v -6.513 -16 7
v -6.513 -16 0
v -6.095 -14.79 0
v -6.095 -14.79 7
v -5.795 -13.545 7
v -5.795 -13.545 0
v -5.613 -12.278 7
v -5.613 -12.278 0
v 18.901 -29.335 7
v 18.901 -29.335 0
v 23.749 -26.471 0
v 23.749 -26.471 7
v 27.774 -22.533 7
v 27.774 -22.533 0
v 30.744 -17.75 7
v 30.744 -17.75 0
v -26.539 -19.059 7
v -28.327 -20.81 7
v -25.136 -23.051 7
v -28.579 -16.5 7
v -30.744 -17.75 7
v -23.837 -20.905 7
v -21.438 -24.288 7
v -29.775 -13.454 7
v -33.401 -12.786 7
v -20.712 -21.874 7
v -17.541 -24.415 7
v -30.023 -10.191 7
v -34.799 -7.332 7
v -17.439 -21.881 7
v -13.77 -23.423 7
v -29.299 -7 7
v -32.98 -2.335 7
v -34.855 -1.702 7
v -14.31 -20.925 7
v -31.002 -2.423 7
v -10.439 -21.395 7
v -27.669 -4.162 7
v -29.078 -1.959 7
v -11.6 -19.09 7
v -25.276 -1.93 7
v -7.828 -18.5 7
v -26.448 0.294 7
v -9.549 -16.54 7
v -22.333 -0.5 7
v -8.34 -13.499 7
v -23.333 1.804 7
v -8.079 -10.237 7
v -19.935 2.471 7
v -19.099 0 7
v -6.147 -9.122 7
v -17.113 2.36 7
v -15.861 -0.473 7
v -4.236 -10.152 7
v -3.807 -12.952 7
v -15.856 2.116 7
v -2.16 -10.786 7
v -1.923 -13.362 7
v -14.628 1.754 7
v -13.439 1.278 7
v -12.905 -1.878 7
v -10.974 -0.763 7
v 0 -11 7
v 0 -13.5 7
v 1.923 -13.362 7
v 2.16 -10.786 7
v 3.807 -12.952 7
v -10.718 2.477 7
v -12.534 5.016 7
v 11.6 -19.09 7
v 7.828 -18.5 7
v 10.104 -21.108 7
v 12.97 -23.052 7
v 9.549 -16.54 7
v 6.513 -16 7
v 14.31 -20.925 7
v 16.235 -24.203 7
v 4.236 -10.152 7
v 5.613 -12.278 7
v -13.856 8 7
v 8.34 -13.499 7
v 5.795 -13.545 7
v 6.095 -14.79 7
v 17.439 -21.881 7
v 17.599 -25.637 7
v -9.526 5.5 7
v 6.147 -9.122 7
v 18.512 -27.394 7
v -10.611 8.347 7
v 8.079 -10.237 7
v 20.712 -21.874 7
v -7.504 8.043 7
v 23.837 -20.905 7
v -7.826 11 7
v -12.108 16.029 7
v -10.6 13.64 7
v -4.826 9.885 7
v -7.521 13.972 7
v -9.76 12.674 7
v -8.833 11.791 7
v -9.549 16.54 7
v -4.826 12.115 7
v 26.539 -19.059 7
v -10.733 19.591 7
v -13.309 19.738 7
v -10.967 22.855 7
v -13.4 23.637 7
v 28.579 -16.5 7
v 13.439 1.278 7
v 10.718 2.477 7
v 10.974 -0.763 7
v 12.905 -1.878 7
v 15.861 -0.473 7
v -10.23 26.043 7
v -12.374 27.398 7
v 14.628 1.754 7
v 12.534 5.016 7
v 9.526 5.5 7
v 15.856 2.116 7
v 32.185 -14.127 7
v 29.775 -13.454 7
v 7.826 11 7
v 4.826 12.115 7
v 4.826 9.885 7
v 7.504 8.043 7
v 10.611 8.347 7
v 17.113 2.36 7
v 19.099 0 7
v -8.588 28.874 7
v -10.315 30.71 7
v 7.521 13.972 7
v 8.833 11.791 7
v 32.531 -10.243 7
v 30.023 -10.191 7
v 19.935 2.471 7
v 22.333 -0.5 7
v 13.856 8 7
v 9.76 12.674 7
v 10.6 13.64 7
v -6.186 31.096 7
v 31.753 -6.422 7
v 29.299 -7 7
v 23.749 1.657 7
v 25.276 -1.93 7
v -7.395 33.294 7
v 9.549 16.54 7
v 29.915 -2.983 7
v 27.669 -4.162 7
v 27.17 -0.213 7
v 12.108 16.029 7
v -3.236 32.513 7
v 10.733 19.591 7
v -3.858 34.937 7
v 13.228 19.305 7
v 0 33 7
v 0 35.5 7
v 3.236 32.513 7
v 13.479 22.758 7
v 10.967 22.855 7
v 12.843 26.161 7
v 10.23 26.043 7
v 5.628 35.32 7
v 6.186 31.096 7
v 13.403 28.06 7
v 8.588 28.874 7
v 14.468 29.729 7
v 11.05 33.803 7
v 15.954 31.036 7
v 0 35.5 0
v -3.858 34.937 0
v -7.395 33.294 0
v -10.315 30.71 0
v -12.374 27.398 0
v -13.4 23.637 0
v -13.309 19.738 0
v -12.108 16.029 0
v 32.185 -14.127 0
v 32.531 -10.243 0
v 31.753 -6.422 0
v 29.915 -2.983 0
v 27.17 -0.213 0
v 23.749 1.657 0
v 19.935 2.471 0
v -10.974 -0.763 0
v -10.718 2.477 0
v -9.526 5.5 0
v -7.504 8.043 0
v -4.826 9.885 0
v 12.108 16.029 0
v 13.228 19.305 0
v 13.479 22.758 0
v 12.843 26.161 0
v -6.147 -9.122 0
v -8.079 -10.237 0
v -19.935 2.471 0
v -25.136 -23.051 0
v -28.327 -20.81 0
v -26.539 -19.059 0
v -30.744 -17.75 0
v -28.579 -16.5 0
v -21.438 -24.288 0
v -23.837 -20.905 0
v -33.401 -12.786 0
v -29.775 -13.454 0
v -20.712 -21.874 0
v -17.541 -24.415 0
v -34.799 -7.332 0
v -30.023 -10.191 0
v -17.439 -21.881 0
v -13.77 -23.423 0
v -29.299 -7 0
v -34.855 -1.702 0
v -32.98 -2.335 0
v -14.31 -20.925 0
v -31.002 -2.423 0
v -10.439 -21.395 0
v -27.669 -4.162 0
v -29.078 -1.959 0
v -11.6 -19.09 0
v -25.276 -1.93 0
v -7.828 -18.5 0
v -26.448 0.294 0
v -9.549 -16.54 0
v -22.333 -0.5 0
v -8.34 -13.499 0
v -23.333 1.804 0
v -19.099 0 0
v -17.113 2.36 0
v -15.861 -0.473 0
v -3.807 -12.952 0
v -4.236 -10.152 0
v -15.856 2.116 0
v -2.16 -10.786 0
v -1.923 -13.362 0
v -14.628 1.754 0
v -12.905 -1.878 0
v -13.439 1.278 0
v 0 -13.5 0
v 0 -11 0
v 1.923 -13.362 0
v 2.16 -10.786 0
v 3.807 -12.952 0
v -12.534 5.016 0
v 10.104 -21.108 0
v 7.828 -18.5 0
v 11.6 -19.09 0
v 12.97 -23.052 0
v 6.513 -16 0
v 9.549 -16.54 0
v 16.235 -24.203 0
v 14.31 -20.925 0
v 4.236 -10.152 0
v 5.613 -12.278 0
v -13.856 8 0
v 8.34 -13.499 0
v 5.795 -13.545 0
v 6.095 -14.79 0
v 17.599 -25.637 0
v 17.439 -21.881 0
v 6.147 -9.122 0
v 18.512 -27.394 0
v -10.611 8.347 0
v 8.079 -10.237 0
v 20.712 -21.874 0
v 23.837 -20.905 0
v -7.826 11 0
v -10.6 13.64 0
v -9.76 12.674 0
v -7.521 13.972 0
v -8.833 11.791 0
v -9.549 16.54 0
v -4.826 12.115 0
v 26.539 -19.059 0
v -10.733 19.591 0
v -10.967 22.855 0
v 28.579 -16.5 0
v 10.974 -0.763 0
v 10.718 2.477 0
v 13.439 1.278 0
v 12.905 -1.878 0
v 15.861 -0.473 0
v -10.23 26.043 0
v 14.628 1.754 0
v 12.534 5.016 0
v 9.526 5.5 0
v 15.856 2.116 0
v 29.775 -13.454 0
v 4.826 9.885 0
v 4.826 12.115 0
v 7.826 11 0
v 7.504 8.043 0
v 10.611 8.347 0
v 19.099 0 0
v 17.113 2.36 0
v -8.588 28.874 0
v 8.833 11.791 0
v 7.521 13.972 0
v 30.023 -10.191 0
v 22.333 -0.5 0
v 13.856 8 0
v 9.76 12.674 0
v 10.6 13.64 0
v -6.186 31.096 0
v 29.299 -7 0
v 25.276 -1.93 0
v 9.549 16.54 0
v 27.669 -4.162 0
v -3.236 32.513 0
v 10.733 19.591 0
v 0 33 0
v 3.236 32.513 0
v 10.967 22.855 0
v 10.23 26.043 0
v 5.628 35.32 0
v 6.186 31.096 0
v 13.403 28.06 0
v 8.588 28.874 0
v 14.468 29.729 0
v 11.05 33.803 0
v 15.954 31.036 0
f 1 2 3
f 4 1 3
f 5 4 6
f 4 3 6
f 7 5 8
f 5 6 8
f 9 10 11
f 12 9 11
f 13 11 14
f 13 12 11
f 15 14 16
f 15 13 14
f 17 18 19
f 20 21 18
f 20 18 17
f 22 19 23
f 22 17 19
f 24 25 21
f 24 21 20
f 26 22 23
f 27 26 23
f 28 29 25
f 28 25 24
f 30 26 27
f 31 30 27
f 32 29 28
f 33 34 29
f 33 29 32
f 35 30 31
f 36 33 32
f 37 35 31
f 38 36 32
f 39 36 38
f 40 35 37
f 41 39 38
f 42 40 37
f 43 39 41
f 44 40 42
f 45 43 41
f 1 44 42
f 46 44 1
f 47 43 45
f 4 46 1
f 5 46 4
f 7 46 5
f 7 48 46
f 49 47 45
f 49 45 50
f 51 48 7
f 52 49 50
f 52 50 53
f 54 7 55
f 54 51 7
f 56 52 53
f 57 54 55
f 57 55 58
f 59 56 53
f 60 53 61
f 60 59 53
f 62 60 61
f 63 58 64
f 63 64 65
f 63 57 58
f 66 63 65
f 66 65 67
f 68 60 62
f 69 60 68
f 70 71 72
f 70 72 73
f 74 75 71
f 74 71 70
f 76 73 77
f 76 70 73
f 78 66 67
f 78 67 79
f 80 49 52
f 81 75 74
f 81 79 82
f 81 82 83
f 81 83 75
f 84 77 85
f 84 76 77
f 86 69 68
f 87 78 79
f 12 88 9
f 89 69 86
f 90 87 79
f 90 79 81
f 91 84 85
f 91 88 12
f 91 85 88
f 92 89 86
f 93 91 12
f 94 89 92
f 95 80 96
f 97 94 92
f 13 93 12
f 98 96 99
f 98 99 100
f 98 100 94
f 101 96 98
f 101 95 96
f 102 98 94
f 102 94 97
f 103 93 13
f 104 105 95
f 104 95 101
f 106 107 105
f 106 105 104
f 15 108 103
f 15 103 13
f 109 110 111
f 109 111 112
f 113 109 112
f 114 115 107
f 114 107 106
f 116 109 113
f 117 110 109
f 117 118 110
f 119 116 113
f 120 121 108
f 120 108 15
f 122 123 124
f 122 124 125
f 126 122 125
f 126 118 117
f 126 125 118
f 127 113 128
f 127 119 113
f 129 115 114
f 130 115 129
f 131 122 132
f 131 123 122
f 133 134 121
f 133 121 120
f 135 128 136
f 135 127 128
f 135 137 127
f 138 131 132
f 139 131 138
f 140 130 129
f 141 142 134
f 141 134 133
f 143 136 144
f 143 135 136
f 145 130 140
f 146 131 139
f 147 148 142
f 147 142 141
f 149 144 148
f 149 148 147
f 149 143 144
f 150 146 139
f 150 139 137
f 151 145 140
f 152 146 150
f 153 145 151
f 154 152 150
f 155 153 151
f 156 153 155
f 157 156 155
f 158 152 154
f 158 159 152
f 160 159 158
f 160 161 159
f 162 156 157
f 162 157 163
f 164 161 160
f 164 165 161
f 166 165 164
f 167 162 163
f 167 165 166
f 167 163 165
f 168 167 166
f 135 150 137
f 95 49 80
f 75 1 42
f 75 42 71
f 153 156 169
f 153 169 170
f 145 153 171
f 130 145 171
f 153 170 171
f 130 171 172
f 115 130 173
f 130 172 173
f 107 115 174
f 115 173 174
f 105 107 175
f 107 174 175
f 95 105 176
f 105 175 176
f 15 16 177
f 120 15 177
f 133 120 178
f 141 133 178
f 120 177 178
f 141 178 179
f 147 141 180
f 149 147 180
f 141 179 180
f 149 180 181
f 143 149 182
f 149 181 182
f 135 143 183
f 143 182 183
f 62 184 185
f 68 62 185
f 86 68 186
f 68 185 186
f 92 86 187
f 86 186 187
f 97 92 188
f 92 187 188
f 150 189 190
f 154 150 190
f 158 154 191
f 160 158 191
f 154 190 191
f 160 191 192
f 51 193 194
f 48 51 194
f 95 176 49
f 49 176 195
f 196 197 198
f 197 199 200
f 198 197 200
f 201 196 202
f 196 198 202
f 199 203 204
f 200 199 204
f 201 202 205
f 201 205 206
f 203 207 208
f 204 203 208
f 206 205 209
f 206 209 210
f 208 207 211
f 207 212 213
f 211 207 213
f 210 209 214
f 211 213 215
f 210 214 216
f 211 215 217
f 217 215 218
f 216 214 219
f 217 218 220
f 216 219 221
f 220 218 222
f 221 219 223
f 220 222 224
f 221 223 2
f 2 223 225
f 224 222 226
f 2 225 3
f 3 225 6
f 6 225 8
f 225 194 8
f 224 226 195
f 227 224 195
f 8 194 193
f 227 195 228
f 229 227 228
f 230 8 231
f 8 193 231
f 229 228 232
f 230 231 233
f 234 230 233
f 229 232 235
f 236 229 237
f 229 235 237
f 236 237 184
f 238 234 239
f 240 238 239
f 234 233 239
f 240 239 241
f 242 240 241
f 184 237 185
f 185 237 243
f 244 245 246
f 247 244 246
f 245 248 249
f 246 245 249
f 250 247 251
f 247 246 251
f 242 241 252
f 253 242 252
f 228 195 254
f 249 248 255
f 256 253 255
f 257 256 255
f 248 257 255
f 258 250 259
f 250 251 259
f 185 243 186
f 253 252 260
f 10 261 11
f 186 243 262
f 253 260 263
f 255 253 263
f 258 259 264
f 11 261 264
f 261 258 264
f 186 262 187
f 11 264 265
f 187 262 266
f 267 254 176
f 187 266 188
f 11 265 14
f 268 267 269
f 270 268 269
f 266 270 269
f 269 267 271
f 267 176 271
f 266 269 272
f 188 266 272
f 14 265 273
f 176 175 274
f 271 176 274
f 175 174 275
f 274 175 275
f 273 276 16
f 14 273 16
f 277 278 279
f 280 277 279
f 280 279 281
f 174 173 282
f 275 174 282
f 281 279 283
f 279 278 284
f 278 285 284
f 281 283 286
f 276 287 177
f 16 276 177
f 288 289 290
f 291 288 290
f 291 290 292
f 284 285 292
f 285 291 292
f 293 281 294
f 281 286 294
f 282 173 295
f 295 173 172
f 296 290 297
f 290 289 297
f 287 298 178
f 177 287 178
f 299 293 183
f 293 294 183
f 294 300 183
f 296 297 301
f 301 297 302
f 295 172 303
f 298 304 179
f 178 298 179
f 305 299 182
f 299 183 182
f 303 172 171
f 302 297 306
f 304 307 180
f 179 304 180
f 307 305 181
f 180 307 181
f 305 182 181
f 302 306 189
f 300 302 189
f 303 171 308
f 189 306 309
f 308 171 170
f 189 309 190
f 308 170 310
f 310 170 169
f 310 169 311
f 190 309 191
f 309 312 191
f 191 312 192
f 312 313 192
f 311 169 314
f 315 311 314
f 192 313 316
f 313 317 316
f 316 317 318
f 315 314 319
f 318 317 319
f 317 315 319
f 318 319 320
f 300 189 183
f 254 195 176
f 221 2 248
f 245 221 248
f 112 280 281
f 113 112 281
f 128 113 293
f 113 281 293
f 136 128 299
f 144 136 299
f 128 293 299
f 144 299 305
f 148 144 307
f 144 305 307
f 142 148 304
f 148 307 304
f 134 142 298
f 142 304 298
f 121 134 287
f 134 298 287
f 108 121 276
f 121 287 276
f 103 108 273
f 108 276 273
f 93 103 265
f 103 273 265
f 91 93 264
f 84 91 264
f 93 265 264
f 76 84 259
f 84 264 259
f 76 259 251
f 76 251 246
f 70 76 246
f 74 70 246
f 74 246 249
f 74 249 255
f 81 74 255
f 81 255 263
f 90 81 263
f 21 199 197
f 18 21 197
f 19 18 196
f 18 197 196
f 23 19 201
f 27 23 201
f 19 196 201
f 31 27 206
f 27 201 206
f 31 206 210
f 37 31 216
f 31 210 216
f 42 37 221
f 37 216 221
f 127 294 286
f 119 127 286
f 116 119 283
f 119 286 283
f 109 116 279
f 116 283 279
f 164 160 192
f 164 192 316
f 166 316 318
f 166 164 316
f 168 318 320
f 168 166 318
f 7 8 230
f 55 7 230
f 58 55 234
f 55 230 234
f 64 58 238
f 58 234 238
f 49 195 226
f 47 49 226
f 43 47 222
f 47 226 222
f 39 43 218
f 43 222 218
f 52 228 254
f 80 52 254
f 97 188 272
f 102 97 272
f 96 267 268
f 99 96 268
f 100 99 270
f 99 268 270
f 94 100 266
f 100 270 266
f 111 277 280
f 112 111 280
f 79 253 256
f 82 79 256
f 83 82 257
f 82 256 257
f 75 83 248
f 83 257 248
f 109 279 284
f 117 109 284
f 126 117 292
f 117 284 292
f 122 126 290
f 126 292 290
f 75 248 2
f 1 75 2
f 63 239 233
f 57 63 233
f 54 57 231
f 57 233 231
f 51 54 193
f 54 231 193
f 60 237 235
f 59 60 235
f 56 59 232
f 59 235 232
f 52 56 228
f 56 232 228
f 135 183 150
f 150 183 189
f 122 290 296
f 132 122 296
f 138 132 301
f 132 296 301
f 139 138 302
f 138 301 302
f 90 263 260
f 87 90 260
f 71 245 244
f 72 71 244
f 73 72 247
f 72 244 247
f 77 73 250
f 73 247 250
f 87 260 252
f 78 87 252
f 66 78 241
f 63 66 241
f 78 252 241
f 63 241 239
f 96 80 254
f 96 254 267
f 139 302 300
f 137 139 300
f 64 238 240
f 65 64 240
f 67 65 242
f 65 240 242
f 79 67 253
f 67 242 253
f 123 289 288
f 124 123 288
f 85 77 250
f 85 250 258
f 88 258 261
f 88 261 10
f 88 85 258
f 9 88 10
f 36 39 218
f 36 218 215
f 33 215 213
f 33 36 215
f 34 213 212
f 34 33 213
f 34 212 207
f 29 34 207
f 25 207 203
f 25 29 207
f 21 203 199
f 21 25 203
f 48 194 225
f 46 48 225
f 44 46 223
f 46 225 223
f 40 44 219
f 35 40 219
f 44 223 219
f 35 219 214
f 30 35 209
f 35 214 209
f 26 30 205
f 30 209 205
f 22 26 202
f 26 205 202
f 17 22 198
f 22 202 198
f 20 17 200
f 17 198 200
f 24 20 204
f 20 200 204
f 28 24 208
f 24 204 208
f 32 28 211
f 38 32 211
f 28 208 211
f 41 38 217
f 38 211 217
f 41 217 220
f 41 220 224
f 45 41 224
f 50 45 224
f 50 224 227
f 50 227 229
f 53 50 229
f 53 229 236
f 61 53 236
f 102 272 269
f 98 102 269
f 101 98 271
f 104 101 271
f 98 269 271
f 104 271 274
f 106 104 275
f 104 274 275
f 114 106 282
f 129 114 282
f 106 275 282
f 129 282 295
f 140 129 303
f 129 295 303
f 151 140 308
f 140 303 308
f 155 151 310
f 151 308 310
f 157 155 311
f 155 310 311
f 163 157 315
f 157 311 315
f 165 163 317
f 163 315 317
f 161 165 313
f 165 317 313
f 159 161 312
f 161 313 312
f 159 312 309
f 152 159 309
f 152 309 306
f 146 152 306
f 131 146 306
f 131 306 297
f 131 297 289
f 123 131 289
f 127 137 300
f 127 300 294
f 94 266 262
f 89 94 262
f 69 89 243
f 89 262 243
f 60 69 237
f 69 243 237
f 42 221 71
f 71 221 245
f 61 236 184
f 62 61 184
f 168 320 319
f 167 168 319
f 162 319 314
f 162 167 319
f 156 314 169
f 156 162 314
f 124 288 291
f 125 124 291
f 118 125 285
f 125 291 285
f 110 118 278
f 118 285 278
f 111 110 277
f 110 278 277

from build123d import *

# Parameters (mm, degrees)
F1_DEPTH = 7
F3_DEPTH = 7


with BuildPart() as f1:
    # F0 (on Top) → F1 (new body)
    with BuildSketch(Plane.XY):
        with BuildLine():
            Line((-13.8564064606, 8), (-10.6000951209, 13.6400966855))
            ThreePointArc((-10.6000951209, 13.6400966855), (-11.4165365305, 14.7949535985), (-12.1076766085, 16.0288889524))
            Line((-12.1076766085, 16.0288889524), (-19.9352633315, 2.4711110476))
            ThreePointArc((-19.9352633315, 2.4711110476), (-18.5210739294, 2.4895338594), (-17.1127178002, 2.3599033145))
            Line((-17.1127178002, 2.3599033145), (-13.8564064606, 8))
        make_face()
        with BuildLine():
            Line((-7.8262379212, 11), (-4.8262379212, 11))
            Line((-4.8262379212, 11), (-4.8262379212, 12.1152932503))
            ThreePointArc((-4.8262379212, 12.1152932503), (0, 33), (4.8262379212, 12.1152932503))
            Line((4.8262379212, 12.1152932503), (4.8262379212, 11))
            Line((4.8262379212, 11), (7.8262379212, 11))
            ThreePointArc((7.8262379212, 11), (9.3072533528, 12.2211946012), (10.6000951209, 13.6400966855))
            ThreePointArc((10.6000951209, 13.6400966855), (11.4165365305, 14.7949535985), (12.1076766085, 16.0288889524))
            ThreePointArc((12.1076766085, 16.0288889524), (0, 35.5), (-12.1076766085, 16.0288889524))
            ThreePointArc((-12.1076766085, 16.0288889524), (-11.4165365305, 14.7949535985), (-10.6000951209, 13.6400966855))
            ThreePointArc((-10.6000951209, 13.6400966855), (-9.3072533528, 12.2211946012), (-7.8262379212, 11))
        make_face()
        with BuildLine():
            ThreePointArc((12.1076766085, 16.0288889524), (11.4165365305, 14.7949535985), (10.6000951209, 13.6400966855))
            Line((10.6000951209, 13.6400966855), (13.8564064606, 8))
            Line((13.8564064606, 8), (17.1127178002, 2.3599033145))
            ThreePointArc((17.1127178002, 2.3599033145), (18.5210739294, 2.4895338594), (19.9352633315, 2.4711110476))
            Line((19.9352633315, 2.4711110476), (12.1076766085, 16.0288889524))
        make_face()
        with BuildLine():
            ThreePointArc((0, -11), (-3.2138778591, -10.5200279993), (-6.1472881936, -9.1219980194))
            Line((-6.1472881936, -9.1219980194), (-8.0790327684, -10.2372912697))
            ThreePointArc((-8.0790327684, -10.2372912697), (-28.5788383249, -16.5), (-12.9052706897, -1.8780019806))
            Line((-12.9052706897, -1.8780019806), (-10.9735261148, -0.7627087303))
            ThreePointArc((-10.9735261148, -0.7627087303), (-9.5262794416, 5.5), (-4.8262379212, 9.8847067497))
            Line((-4.8262379212, 9.8847067497), (-4.8262379212, 11))
            Line((-4.8262379212, 11), (-7.8262379212, 11))
            ThreePointArc((-7.8262379212, 11), (-11.6913429511, 6.75), (-13.4393984023, 1.2777208559))
            ThreePointArc((-13.4393984023, 1.2777208559), (-15.2374916656, 1.9497205423), (-17.1127178002, 2.3599033145))
            ThreePointArc((-17.1127178002, 2.3599033145), (-18.5210739294, 2.4895338594), (-19.9352633315, 2.4711110476))
            ThreePointArc((-19.9352633315, 2.4711110476), (-30.7439018343, -17.75), (-7.8275867229, -18.5))
            Line((-7.8275867229, -18.5), (7.8275867229, -18.5))
            ThreePointArc((7.8275867229, -18.5), (30.7439018343, -17.75), (19.9352633315, 2.4711110476))
            ThreePointArc((19.9352633315, 2.4711110476), (18.5210739294, 2.4895338594), (17.1127178002, 2.3599033145))
            ThreePointArc((17.1127178002, 2.3599033145), (15.2374916656, 1.9497205423), (13.4393984023, 1.2777208559))
            ThreePointArc((13.4393984023, 1.2777208559), (11.6913429511, 6.75), (7.8262379212, 11))
            Line((7.8262379212, 11), (4.8262379212, 11))
            Line((4.8262379212, 11), (4.8262379212, 9.8847067497))
            ThreePointArc((4.8262379212, 9.8847067497), (9.5262794416, 5.5), (10.9735261148, -0.7627087303))
            Line((10.9735261148, -0.7627087303), (12.9052706897, -1.8780019806))
            ThreePointArc((12.9052706897, -1.8780019806), (28.5788383249, -16.5), (8.0790327684, -10.2372912697))
            Line((8.0790327684, -10.2372912697), (6.1472881936, -9.1219980194))
            ThreePointArc((6.1472881936, -9.1219980194), (3.2138778591, -10.5200279993), (0, -11))
        make_face()
        with BuildLine():
            ThreePointArc((-5.613160481, -12.2777208559), (-2.8723482071, -13.1908913943), (0, -13.5))
            ThreePointArc((0, -13.5), (2.8723482071, -13.1908913943), (5.613160481, -12.2777208559))
            ThreePointArc((5.613160481, -12.2777208559), (5.9302383129, -14.1709151435), (6.5126226793, -16))
            Line((6.5126226793, -16), (0, -16))
            Line((0, -16), (-6.5126226793, -16))
            ThreePointArc((-6.5126226793, -16), (-5.9302383129, -14.1709151435), (-5.613160481, -12.2777208559))
        make_face(mode=Mode.SUBTRACT)
    extrude(amount=F1_DEPTH)

    # F2 (on face) → F3 (join)
    with BuildSketch(Plane.XY.offset(7)):
        with BuildLine():
            ThreePointArc((12.8426779045, 26.1612046623), (13.8763872298, 28.9318631067), (15.9538742155, 31.0364179313))
            ThreePointArc((15.9538742155, 31.0364179313), (8.3843737037, 34.7244815518), (0, 35.5))
            ThreePointArc((0, 35.5), (7.9395760926, 32.9184766094), (12.8426779045, 26.1612046623))
        make_face()
        with BuildLine():
            ThreePointArc((-30.7439018343, -17.75), (-32.4780250439, -9.5833637133), (-29.0776067834, -1.9585170132))
            ThreePointArc((-29.0776067834, -1.9585170132), (-31.9939220442, -2.4486276996), (-34.8552634787, -1.7017486063))
            ThreePointArc((-34.8552634787, -1.7017486063), (-34.264470009, -10.1011601537), (-30.7439018343, -17.75))
        make_face()
        with BuildLine():
            ThreePointArc((18.9013892633, -29.334669325), (25.8800963053, -24.6233213981), (30.7439018343, -17.75))
            ThreePointArc((30.7439018343, -17.75), (24.5384489513, -23.3351128962), (16.2349288789, -24.202687649))
            ThreePointArc((16.2349288789, -24.2026876491), (18.1175348143, -26.4832354072), (18.9013892633, -29.334669325))
        make_face()
    extrude(amount=-F3_DEPTH)


solid = f1.part
